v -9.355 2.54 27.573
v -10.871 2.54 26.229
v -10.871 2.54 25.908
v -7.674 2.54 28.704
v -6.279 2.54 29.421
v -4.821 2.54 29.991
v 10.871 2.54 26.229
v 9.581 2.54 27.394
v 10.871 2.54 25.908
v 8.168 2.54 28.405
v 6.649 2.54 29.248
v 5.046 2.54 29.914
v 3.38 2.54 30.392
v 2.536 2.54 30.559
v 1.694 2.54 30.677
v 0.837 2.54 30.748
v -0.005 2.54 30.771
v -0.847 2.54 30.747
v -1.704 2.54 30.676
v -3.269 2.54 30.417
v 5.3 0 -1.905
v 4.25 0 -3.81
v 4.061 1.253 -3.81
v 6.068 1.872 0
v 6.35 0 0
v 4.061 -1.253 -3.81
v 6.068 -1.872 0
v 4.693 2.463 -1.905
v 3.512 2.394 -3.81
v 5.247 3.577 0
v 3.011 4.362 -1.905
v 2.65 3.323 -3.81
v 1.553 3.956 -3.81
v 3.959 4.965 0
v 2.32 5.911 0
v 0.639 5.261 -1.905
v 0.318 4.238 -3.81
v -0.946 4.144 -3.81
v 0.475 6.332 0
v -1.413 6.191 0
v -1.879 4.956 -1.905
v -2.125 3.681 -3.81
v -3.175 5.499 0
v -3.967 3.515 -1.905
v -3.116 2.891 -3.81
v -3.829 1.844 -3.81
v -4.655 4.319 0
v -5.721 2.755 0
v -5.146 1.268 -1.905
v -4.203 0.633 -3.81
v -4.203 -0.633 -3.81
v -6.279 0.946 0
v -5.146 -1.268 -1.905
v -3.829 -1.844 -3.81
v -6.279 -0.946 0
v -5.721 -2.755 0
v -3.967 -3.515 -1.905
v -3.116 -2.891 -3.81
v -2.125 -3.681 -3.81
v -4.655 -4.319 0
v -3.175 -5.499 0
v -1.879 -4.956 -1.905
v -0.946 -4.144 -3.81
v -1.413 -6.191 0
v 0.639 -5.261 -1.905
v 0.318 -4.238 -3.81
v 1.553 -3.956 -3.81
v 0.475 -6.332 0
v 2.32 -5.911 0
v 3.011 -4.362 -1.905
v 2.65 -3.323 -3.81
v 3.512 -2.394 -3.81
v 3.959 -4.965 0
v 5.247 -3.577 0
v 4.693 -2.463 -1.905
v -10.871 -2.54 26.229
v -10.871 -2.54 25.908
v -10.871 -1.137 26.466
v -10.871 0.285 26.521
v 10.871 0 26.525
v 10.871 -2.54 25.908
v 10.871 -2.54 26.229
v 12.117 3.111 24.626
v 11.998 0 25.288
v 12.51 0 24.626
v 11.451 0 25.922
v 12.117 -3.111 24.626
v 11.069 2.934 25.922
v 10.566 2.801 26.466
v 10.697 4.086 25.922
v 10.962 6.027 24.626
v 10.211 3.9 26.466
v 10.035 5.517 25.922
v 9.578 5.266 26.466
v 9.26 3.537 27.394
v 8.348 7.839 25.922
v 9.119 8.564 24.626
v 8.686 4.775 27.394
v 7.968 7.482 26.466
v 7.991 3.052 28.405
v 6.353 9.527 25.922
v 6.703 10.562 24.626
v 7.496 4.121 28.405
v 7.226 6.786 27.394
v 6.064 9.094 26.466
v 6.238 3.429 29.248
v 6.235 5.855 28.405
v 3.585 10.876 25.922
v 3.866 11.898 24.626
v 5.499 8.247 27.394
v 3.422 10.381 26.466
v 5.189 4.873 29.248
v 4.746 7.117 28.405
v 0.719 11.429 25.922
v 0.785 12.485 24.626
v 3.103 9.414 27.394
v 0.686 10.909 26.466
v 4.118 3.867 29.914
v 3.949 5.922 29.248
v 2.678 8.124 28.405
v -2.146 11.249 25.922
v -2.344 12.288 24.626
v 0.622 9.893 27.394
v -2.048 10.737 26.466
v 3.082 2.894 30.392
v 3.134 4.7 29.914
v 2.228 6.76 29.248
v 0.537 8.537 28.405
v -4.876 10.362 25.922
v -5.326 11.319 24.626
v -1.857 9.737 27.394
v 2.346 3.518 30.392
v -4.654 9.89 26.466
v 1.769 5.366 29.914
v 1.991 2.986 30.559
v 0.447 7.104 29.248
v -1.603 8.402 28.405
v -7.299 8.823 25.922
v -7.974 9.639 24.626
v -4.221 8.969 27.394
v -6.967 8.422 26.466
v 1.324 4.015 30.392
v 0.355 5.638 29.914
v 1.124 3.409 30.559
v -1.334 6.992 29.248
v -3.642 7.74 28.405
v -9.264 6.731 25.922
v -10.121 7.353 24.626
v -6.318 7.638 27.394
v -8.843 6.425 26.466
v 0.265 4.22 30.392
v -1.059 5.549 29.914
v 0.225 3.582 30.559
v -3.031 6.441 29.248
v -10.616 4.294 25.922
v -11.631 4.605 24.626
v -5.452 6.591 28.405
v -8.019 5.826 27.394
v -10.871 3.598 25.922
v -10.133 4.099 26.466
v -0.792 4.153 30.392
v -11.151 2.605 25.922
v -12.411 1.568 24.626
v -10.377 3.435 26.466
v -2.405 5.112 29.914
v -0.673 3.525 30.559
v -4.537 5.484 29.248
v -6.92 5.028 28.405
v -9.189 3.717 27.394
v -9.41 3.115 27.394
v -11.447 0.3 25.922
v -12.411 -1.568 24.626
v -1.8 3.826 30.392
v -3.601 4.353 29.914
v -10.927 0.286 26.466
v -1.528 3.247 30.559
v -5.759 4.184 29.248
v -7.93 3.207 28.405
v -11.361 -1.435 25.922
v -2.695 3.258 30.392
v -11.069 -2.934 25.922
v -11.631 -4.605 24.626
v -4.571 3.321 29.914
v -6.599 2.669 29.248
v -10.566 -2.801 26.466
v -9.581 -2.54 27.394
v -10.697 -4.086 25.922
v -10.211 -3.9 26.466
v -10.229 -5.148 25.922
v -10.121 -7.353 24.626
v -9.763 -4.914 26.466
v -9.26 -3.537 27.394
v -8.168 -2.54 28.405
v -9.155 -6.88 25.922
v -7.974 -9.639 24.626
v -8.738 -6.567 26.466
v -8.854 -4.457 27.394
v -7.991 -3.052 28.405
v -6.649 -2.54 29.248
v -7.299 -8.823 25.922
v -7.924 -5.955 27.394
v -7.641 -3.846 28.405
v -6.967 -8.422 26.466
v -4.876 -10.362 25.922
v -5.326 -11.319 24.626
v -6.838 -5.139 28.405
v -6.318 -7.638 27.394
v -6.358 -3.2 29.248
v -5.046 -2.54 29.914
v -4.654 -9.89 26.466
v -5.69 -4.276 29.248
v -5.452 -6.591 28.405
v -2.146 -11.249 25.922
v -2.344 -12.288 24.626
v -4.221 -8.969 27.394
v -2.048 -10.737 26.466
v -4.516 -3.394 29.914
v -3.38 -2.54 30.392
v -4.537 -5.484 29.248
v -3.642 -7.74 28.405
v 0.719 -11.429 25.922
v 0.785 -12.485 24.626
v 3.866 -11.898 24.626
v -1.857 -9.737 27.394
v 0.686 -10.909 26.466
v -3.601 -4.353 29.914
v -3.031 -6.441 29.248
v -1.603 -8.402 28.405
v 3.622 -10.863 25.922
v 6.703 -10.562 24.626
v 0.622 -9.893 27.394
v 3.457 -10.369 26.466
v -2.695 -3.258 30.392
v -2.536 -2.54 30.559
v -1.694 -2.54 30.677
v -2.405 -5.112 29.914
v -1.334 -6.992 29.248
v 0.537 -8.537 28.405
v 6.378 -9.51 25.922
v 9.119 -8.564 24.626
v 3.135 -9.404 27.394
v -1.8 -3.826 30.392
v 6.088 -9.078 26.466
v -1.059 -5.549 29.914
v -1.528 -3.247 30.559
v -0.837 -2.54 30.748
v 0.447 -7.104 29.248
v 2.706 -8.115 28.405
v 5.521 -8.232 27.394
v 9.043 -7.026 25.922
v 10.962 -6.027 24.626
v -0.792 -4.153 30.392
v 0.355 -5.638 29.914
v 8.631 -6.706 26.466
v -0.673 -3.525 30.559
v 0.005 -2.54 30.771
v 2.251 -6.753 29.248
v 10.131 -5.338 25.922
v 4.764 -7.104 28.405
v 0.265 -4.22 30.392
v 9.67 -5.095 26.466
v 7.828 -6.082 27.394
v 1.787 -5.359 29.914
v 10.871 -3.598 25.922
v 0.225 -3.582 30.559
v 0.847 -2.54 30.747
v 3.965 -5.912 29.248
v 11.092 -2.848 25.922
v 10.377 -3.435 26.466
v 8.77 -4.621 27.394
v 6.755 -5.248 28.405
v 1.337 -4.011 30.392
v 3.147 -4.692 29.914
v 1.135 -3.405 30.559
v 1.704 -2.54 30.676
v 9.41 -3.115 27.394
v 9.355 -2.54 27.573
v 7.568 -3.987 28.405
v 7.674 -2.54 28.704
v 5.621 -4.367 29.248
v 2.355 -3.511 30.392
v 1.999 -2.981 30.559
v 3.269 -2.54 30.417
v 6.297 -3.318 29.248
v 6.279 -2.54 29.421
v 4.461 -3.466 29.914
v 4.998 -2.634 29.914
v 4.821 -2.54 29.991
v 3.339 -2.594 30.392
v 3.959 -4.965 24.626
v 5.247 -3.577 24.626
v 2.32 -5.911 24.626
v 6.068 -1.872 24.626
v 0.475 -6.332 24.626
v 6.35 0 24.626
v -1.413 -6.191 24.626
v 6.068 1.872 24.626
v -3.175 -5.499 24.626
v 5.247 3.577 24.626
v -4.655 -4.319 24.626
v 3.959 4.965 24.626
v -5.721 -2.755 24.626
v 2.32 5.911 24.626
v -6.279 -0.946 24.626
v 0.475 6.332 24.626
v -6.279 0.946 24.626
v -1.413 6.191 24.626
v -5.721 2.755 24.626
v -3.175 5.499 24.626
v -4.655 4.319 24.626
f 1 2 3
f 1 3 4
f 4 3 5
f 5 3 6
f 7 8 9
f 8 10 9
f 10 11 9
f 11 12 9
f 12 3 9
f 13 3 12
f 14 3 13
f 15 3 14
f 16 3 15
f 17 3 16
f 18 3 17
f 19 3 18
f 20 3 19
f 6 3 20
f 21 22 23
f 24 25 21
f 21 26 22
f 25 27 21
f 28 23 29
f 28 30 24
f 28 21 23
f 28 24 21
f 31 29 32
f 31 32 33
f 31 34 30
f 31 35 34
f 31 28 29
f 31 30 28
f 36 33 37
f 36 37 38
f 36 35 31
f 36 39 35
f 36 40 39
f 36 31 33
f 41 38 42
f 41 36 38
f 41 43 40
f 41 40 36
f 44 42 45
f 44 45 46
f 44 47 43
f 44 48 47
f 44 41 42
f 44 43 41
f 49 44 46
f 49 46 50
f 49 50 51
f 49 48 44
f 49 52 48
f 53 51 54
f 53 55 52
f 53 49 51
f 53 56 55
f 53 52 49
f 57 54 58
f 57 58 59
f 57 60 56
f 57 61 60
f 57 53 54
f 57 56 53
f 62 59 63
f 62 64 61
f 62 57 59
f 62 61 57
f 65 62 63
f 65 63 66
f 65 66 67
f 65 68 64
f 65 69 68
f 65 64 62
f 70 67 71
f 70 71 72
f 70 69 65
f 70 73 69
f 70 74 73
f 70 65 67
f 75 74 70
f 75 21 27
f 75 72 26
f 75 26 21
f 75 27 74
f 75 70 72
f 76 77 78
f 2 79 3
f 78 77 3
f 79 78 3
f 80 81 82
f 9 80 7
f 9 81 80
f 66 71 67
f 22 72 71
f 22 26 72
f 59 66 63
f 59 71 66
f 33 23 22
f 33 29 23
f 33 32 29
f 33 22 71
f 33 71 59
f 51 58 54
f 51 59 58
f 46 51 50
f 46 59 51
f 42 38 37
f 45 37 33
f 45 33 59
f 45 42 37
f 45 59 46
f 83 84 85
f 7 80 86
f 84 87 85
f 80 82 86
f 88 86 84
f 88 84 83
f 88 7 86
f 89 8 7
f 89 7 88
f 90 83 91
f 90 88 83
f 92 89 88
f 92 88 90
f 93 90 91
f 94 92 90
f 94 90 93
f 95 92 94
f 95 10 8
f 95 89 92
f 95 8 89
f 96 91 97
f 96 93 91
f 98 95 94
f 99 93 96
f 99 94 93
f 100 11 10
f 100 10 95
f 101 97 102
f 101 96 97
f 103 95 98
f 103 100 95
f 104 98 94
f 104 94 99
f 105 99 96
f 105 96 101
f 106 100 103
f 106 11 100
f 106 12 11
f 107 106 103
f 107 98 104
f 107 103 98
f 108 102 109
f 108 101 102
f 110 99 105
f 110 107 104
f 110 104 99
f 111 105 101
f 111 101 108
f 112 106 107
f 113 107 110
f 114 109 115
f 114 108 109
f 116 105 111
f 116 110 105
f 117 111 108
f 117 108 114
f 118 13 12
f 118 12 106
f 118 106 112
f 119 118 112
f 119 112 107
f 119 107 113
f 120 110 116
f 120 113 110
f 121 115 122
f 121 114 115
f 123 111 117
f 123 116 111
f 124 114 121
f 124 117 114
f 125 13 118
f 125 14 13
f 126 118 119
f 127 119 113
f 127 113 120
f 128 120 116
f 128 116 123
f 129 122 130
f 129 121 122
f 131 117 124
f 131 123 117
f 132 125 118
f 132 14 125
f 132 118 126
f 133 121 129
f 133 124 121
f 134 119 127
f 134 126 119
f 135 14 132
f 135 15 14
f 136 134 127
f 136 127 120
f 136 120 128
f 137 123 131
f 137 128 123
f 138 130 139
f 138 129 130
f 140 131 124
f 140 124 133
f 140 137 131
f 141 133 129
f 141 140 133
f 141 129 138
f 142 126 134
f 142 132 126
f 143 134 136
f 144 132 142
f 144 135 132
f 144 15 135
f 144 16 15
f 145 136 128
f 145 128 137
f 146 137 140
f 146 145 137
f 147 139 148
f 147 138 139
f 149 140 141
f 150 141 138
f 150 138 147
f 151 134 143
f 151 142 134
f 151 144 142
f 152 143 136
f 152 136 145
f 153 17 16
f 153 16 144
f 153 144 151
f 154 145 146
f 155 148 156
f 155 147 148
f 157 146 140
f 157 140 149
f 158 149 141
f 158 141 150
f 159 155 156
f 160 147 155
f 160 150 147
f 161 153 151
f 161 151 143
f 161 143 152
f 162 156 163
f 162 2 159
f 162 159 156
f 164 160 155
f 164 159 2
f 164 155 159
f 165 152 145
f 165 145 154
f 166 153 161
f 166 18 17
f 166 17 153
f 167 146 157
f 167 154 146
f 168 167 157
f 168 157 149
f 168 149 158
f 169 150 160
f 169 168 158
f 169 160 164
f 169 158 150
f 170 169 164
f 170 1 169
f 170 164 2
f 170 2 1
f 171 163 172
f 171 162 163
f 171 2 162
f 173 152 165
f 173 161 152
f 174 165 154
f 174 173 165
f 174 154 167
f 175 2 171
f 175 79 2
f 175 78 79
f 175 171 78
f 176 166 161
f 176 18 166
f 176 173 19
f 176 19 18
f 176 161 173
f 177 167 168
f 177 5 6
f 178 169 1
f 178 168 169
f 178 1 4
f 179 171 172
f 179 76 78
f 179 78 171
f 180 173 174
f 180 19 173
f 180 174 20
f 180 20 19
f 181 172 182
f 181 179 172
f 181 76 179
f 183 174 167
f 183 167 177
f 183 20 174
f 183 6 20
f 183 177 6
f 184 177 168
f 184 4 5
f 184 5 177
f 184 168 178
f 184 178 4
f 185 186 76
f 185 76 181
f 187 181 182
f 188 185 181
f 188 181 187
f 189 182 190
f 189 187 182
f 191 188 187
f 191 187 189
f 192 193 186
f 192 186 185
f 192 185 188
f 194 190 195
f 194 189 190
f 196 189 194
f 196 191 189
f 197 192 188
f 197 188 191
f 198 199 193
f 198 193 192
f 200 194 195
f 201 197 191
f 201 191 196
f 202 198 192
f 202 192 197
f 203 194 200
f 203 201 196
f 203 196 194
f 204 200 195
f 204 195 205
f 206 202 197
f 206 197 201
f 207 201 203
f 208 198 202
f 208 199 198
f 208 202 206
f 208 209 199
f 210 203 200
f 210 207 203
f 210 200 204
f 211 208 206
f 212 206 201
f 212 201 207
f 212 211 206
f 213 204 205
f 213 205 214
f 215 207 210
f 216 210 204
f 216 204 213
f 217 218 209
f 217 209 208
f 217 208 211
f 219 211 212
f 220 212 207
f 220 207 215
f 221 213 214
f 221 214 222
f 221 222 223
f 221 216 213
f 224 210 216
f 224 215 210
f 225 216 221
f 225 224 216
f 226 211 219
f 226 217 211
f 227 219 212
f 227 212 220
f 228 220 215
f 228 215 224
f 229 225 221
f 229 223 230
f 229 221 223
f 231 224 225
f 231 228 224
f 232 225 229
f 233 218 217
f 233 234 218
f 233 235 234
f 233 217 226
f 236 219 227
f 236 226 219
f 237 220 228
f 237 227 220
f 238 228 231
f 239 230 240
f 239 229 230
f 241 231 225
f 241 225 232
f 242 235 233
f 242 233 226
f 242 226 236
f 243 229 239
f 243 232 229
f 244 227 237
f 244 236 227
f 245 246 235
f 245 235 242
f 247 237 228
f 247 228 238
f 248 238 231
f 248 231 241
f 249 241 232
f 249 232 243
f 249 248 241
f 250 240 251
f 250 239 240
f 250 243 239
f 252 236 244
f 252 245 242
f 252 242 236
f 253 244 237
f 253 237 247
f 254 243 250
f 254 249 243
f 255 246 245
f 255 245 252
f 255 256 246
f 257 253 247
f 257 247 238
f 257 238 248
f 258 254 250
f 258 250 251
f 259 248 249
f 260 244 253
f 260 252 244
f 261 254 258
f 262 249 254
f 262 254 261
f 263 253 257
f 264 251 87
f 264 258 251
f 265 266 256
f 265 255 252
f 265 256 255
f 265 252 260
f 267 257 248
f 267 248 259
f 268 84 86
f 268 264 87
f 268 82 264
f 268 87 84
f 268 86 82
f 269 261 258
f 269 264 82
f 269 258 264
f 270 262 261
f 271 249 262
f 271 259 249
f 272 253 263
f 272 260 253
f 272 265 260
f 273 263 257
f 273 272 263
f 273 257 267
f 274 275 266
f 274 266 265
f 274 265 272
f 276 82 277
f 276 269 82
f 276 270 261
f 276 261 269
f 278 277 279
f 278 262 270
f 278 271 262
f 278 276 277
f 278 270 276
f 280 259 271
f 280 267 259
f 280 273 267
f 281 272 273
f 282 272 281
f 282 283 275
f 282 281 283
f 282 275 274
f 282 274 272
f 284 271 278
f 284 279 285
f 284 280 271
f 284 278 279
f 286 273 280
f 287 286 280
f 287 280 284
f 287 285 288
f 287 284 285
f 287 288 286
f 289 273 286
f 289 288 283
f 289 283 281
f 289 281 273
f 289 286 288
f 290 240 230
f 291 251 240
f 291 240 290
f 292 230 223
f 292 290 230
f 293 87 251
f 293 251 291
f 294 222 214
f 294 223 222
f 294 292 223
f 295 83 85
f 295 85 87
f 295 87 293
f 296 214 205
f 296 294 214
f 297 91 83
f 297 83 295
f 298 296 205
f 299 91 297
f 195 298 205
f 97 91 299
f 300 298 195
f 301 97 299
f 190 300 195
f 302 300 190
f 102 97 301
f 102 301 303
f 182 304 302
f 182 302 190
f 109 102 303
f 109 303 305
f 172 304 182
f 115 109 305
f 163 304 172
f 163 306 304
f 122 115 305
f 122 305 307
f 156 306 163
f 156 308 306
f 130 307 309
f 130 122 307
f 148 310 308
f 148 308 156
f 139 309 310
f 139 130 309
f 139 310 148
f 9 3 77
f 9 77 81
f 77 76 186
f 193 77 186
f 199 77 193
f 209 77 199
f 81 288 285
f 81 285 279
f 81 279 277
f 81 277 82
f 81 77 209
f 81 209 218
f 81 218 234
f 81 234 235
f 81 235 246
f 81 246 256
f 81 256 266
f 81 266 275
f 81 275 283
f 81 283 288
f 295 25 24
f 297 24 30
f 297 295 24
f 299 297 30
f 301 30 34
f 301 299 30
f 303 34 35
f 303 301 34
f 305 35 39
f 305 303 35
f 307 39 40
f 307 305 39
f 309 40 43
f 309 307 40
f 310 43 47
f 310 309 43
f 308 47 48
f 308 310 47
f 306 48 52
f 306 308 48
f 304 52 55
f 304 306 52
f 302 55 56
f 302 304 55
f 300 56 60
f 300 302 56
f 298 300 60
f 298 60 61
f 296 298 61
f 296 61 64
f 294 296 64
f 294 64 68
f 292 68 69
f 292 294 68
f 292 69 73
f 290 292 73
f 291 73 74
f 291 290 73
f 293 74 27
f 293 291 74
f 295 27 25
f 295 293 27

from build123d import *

# Parameters (mm, degrees)
F3_W     = 21.7424
F3_H     = 5.08
F4_DEPTH = 5.073509


with BuildPart() as f1:
    # F0 (on Front) → F1 (revolve)
    with BuildSketch(Plane.XZ):
        with BuildLine():
            Line((0, 30.980509), (0, 0))
            Line((0, 0), (6.35, 0))
            Line((6.35, 0), (6.35, 24.625533))
            Line((6.35, 24.625533), (12.509782, 24.625533))
            ThreePointArc((12.509782, 24.625533), (7.015703, 29.300681), (0, 30.980509))
        make_face()
        Polygon((6.35, 0), (0, 0), (0, -3.81), (4.250277, -3.81), align=None)
    revolve(axis=Axis((0, 0, 15.490254), (0, 0, 1)))

    # F3 (on offset) → F4 (cut, through all)
    with BuildSketch(Plane.XY.offset(25.908)):
        Rectangle(F3_W, F3_H)
    extrude(amount=F4_DEPTH, mode=Mode.SUBTRACT)


solid = f1.part
